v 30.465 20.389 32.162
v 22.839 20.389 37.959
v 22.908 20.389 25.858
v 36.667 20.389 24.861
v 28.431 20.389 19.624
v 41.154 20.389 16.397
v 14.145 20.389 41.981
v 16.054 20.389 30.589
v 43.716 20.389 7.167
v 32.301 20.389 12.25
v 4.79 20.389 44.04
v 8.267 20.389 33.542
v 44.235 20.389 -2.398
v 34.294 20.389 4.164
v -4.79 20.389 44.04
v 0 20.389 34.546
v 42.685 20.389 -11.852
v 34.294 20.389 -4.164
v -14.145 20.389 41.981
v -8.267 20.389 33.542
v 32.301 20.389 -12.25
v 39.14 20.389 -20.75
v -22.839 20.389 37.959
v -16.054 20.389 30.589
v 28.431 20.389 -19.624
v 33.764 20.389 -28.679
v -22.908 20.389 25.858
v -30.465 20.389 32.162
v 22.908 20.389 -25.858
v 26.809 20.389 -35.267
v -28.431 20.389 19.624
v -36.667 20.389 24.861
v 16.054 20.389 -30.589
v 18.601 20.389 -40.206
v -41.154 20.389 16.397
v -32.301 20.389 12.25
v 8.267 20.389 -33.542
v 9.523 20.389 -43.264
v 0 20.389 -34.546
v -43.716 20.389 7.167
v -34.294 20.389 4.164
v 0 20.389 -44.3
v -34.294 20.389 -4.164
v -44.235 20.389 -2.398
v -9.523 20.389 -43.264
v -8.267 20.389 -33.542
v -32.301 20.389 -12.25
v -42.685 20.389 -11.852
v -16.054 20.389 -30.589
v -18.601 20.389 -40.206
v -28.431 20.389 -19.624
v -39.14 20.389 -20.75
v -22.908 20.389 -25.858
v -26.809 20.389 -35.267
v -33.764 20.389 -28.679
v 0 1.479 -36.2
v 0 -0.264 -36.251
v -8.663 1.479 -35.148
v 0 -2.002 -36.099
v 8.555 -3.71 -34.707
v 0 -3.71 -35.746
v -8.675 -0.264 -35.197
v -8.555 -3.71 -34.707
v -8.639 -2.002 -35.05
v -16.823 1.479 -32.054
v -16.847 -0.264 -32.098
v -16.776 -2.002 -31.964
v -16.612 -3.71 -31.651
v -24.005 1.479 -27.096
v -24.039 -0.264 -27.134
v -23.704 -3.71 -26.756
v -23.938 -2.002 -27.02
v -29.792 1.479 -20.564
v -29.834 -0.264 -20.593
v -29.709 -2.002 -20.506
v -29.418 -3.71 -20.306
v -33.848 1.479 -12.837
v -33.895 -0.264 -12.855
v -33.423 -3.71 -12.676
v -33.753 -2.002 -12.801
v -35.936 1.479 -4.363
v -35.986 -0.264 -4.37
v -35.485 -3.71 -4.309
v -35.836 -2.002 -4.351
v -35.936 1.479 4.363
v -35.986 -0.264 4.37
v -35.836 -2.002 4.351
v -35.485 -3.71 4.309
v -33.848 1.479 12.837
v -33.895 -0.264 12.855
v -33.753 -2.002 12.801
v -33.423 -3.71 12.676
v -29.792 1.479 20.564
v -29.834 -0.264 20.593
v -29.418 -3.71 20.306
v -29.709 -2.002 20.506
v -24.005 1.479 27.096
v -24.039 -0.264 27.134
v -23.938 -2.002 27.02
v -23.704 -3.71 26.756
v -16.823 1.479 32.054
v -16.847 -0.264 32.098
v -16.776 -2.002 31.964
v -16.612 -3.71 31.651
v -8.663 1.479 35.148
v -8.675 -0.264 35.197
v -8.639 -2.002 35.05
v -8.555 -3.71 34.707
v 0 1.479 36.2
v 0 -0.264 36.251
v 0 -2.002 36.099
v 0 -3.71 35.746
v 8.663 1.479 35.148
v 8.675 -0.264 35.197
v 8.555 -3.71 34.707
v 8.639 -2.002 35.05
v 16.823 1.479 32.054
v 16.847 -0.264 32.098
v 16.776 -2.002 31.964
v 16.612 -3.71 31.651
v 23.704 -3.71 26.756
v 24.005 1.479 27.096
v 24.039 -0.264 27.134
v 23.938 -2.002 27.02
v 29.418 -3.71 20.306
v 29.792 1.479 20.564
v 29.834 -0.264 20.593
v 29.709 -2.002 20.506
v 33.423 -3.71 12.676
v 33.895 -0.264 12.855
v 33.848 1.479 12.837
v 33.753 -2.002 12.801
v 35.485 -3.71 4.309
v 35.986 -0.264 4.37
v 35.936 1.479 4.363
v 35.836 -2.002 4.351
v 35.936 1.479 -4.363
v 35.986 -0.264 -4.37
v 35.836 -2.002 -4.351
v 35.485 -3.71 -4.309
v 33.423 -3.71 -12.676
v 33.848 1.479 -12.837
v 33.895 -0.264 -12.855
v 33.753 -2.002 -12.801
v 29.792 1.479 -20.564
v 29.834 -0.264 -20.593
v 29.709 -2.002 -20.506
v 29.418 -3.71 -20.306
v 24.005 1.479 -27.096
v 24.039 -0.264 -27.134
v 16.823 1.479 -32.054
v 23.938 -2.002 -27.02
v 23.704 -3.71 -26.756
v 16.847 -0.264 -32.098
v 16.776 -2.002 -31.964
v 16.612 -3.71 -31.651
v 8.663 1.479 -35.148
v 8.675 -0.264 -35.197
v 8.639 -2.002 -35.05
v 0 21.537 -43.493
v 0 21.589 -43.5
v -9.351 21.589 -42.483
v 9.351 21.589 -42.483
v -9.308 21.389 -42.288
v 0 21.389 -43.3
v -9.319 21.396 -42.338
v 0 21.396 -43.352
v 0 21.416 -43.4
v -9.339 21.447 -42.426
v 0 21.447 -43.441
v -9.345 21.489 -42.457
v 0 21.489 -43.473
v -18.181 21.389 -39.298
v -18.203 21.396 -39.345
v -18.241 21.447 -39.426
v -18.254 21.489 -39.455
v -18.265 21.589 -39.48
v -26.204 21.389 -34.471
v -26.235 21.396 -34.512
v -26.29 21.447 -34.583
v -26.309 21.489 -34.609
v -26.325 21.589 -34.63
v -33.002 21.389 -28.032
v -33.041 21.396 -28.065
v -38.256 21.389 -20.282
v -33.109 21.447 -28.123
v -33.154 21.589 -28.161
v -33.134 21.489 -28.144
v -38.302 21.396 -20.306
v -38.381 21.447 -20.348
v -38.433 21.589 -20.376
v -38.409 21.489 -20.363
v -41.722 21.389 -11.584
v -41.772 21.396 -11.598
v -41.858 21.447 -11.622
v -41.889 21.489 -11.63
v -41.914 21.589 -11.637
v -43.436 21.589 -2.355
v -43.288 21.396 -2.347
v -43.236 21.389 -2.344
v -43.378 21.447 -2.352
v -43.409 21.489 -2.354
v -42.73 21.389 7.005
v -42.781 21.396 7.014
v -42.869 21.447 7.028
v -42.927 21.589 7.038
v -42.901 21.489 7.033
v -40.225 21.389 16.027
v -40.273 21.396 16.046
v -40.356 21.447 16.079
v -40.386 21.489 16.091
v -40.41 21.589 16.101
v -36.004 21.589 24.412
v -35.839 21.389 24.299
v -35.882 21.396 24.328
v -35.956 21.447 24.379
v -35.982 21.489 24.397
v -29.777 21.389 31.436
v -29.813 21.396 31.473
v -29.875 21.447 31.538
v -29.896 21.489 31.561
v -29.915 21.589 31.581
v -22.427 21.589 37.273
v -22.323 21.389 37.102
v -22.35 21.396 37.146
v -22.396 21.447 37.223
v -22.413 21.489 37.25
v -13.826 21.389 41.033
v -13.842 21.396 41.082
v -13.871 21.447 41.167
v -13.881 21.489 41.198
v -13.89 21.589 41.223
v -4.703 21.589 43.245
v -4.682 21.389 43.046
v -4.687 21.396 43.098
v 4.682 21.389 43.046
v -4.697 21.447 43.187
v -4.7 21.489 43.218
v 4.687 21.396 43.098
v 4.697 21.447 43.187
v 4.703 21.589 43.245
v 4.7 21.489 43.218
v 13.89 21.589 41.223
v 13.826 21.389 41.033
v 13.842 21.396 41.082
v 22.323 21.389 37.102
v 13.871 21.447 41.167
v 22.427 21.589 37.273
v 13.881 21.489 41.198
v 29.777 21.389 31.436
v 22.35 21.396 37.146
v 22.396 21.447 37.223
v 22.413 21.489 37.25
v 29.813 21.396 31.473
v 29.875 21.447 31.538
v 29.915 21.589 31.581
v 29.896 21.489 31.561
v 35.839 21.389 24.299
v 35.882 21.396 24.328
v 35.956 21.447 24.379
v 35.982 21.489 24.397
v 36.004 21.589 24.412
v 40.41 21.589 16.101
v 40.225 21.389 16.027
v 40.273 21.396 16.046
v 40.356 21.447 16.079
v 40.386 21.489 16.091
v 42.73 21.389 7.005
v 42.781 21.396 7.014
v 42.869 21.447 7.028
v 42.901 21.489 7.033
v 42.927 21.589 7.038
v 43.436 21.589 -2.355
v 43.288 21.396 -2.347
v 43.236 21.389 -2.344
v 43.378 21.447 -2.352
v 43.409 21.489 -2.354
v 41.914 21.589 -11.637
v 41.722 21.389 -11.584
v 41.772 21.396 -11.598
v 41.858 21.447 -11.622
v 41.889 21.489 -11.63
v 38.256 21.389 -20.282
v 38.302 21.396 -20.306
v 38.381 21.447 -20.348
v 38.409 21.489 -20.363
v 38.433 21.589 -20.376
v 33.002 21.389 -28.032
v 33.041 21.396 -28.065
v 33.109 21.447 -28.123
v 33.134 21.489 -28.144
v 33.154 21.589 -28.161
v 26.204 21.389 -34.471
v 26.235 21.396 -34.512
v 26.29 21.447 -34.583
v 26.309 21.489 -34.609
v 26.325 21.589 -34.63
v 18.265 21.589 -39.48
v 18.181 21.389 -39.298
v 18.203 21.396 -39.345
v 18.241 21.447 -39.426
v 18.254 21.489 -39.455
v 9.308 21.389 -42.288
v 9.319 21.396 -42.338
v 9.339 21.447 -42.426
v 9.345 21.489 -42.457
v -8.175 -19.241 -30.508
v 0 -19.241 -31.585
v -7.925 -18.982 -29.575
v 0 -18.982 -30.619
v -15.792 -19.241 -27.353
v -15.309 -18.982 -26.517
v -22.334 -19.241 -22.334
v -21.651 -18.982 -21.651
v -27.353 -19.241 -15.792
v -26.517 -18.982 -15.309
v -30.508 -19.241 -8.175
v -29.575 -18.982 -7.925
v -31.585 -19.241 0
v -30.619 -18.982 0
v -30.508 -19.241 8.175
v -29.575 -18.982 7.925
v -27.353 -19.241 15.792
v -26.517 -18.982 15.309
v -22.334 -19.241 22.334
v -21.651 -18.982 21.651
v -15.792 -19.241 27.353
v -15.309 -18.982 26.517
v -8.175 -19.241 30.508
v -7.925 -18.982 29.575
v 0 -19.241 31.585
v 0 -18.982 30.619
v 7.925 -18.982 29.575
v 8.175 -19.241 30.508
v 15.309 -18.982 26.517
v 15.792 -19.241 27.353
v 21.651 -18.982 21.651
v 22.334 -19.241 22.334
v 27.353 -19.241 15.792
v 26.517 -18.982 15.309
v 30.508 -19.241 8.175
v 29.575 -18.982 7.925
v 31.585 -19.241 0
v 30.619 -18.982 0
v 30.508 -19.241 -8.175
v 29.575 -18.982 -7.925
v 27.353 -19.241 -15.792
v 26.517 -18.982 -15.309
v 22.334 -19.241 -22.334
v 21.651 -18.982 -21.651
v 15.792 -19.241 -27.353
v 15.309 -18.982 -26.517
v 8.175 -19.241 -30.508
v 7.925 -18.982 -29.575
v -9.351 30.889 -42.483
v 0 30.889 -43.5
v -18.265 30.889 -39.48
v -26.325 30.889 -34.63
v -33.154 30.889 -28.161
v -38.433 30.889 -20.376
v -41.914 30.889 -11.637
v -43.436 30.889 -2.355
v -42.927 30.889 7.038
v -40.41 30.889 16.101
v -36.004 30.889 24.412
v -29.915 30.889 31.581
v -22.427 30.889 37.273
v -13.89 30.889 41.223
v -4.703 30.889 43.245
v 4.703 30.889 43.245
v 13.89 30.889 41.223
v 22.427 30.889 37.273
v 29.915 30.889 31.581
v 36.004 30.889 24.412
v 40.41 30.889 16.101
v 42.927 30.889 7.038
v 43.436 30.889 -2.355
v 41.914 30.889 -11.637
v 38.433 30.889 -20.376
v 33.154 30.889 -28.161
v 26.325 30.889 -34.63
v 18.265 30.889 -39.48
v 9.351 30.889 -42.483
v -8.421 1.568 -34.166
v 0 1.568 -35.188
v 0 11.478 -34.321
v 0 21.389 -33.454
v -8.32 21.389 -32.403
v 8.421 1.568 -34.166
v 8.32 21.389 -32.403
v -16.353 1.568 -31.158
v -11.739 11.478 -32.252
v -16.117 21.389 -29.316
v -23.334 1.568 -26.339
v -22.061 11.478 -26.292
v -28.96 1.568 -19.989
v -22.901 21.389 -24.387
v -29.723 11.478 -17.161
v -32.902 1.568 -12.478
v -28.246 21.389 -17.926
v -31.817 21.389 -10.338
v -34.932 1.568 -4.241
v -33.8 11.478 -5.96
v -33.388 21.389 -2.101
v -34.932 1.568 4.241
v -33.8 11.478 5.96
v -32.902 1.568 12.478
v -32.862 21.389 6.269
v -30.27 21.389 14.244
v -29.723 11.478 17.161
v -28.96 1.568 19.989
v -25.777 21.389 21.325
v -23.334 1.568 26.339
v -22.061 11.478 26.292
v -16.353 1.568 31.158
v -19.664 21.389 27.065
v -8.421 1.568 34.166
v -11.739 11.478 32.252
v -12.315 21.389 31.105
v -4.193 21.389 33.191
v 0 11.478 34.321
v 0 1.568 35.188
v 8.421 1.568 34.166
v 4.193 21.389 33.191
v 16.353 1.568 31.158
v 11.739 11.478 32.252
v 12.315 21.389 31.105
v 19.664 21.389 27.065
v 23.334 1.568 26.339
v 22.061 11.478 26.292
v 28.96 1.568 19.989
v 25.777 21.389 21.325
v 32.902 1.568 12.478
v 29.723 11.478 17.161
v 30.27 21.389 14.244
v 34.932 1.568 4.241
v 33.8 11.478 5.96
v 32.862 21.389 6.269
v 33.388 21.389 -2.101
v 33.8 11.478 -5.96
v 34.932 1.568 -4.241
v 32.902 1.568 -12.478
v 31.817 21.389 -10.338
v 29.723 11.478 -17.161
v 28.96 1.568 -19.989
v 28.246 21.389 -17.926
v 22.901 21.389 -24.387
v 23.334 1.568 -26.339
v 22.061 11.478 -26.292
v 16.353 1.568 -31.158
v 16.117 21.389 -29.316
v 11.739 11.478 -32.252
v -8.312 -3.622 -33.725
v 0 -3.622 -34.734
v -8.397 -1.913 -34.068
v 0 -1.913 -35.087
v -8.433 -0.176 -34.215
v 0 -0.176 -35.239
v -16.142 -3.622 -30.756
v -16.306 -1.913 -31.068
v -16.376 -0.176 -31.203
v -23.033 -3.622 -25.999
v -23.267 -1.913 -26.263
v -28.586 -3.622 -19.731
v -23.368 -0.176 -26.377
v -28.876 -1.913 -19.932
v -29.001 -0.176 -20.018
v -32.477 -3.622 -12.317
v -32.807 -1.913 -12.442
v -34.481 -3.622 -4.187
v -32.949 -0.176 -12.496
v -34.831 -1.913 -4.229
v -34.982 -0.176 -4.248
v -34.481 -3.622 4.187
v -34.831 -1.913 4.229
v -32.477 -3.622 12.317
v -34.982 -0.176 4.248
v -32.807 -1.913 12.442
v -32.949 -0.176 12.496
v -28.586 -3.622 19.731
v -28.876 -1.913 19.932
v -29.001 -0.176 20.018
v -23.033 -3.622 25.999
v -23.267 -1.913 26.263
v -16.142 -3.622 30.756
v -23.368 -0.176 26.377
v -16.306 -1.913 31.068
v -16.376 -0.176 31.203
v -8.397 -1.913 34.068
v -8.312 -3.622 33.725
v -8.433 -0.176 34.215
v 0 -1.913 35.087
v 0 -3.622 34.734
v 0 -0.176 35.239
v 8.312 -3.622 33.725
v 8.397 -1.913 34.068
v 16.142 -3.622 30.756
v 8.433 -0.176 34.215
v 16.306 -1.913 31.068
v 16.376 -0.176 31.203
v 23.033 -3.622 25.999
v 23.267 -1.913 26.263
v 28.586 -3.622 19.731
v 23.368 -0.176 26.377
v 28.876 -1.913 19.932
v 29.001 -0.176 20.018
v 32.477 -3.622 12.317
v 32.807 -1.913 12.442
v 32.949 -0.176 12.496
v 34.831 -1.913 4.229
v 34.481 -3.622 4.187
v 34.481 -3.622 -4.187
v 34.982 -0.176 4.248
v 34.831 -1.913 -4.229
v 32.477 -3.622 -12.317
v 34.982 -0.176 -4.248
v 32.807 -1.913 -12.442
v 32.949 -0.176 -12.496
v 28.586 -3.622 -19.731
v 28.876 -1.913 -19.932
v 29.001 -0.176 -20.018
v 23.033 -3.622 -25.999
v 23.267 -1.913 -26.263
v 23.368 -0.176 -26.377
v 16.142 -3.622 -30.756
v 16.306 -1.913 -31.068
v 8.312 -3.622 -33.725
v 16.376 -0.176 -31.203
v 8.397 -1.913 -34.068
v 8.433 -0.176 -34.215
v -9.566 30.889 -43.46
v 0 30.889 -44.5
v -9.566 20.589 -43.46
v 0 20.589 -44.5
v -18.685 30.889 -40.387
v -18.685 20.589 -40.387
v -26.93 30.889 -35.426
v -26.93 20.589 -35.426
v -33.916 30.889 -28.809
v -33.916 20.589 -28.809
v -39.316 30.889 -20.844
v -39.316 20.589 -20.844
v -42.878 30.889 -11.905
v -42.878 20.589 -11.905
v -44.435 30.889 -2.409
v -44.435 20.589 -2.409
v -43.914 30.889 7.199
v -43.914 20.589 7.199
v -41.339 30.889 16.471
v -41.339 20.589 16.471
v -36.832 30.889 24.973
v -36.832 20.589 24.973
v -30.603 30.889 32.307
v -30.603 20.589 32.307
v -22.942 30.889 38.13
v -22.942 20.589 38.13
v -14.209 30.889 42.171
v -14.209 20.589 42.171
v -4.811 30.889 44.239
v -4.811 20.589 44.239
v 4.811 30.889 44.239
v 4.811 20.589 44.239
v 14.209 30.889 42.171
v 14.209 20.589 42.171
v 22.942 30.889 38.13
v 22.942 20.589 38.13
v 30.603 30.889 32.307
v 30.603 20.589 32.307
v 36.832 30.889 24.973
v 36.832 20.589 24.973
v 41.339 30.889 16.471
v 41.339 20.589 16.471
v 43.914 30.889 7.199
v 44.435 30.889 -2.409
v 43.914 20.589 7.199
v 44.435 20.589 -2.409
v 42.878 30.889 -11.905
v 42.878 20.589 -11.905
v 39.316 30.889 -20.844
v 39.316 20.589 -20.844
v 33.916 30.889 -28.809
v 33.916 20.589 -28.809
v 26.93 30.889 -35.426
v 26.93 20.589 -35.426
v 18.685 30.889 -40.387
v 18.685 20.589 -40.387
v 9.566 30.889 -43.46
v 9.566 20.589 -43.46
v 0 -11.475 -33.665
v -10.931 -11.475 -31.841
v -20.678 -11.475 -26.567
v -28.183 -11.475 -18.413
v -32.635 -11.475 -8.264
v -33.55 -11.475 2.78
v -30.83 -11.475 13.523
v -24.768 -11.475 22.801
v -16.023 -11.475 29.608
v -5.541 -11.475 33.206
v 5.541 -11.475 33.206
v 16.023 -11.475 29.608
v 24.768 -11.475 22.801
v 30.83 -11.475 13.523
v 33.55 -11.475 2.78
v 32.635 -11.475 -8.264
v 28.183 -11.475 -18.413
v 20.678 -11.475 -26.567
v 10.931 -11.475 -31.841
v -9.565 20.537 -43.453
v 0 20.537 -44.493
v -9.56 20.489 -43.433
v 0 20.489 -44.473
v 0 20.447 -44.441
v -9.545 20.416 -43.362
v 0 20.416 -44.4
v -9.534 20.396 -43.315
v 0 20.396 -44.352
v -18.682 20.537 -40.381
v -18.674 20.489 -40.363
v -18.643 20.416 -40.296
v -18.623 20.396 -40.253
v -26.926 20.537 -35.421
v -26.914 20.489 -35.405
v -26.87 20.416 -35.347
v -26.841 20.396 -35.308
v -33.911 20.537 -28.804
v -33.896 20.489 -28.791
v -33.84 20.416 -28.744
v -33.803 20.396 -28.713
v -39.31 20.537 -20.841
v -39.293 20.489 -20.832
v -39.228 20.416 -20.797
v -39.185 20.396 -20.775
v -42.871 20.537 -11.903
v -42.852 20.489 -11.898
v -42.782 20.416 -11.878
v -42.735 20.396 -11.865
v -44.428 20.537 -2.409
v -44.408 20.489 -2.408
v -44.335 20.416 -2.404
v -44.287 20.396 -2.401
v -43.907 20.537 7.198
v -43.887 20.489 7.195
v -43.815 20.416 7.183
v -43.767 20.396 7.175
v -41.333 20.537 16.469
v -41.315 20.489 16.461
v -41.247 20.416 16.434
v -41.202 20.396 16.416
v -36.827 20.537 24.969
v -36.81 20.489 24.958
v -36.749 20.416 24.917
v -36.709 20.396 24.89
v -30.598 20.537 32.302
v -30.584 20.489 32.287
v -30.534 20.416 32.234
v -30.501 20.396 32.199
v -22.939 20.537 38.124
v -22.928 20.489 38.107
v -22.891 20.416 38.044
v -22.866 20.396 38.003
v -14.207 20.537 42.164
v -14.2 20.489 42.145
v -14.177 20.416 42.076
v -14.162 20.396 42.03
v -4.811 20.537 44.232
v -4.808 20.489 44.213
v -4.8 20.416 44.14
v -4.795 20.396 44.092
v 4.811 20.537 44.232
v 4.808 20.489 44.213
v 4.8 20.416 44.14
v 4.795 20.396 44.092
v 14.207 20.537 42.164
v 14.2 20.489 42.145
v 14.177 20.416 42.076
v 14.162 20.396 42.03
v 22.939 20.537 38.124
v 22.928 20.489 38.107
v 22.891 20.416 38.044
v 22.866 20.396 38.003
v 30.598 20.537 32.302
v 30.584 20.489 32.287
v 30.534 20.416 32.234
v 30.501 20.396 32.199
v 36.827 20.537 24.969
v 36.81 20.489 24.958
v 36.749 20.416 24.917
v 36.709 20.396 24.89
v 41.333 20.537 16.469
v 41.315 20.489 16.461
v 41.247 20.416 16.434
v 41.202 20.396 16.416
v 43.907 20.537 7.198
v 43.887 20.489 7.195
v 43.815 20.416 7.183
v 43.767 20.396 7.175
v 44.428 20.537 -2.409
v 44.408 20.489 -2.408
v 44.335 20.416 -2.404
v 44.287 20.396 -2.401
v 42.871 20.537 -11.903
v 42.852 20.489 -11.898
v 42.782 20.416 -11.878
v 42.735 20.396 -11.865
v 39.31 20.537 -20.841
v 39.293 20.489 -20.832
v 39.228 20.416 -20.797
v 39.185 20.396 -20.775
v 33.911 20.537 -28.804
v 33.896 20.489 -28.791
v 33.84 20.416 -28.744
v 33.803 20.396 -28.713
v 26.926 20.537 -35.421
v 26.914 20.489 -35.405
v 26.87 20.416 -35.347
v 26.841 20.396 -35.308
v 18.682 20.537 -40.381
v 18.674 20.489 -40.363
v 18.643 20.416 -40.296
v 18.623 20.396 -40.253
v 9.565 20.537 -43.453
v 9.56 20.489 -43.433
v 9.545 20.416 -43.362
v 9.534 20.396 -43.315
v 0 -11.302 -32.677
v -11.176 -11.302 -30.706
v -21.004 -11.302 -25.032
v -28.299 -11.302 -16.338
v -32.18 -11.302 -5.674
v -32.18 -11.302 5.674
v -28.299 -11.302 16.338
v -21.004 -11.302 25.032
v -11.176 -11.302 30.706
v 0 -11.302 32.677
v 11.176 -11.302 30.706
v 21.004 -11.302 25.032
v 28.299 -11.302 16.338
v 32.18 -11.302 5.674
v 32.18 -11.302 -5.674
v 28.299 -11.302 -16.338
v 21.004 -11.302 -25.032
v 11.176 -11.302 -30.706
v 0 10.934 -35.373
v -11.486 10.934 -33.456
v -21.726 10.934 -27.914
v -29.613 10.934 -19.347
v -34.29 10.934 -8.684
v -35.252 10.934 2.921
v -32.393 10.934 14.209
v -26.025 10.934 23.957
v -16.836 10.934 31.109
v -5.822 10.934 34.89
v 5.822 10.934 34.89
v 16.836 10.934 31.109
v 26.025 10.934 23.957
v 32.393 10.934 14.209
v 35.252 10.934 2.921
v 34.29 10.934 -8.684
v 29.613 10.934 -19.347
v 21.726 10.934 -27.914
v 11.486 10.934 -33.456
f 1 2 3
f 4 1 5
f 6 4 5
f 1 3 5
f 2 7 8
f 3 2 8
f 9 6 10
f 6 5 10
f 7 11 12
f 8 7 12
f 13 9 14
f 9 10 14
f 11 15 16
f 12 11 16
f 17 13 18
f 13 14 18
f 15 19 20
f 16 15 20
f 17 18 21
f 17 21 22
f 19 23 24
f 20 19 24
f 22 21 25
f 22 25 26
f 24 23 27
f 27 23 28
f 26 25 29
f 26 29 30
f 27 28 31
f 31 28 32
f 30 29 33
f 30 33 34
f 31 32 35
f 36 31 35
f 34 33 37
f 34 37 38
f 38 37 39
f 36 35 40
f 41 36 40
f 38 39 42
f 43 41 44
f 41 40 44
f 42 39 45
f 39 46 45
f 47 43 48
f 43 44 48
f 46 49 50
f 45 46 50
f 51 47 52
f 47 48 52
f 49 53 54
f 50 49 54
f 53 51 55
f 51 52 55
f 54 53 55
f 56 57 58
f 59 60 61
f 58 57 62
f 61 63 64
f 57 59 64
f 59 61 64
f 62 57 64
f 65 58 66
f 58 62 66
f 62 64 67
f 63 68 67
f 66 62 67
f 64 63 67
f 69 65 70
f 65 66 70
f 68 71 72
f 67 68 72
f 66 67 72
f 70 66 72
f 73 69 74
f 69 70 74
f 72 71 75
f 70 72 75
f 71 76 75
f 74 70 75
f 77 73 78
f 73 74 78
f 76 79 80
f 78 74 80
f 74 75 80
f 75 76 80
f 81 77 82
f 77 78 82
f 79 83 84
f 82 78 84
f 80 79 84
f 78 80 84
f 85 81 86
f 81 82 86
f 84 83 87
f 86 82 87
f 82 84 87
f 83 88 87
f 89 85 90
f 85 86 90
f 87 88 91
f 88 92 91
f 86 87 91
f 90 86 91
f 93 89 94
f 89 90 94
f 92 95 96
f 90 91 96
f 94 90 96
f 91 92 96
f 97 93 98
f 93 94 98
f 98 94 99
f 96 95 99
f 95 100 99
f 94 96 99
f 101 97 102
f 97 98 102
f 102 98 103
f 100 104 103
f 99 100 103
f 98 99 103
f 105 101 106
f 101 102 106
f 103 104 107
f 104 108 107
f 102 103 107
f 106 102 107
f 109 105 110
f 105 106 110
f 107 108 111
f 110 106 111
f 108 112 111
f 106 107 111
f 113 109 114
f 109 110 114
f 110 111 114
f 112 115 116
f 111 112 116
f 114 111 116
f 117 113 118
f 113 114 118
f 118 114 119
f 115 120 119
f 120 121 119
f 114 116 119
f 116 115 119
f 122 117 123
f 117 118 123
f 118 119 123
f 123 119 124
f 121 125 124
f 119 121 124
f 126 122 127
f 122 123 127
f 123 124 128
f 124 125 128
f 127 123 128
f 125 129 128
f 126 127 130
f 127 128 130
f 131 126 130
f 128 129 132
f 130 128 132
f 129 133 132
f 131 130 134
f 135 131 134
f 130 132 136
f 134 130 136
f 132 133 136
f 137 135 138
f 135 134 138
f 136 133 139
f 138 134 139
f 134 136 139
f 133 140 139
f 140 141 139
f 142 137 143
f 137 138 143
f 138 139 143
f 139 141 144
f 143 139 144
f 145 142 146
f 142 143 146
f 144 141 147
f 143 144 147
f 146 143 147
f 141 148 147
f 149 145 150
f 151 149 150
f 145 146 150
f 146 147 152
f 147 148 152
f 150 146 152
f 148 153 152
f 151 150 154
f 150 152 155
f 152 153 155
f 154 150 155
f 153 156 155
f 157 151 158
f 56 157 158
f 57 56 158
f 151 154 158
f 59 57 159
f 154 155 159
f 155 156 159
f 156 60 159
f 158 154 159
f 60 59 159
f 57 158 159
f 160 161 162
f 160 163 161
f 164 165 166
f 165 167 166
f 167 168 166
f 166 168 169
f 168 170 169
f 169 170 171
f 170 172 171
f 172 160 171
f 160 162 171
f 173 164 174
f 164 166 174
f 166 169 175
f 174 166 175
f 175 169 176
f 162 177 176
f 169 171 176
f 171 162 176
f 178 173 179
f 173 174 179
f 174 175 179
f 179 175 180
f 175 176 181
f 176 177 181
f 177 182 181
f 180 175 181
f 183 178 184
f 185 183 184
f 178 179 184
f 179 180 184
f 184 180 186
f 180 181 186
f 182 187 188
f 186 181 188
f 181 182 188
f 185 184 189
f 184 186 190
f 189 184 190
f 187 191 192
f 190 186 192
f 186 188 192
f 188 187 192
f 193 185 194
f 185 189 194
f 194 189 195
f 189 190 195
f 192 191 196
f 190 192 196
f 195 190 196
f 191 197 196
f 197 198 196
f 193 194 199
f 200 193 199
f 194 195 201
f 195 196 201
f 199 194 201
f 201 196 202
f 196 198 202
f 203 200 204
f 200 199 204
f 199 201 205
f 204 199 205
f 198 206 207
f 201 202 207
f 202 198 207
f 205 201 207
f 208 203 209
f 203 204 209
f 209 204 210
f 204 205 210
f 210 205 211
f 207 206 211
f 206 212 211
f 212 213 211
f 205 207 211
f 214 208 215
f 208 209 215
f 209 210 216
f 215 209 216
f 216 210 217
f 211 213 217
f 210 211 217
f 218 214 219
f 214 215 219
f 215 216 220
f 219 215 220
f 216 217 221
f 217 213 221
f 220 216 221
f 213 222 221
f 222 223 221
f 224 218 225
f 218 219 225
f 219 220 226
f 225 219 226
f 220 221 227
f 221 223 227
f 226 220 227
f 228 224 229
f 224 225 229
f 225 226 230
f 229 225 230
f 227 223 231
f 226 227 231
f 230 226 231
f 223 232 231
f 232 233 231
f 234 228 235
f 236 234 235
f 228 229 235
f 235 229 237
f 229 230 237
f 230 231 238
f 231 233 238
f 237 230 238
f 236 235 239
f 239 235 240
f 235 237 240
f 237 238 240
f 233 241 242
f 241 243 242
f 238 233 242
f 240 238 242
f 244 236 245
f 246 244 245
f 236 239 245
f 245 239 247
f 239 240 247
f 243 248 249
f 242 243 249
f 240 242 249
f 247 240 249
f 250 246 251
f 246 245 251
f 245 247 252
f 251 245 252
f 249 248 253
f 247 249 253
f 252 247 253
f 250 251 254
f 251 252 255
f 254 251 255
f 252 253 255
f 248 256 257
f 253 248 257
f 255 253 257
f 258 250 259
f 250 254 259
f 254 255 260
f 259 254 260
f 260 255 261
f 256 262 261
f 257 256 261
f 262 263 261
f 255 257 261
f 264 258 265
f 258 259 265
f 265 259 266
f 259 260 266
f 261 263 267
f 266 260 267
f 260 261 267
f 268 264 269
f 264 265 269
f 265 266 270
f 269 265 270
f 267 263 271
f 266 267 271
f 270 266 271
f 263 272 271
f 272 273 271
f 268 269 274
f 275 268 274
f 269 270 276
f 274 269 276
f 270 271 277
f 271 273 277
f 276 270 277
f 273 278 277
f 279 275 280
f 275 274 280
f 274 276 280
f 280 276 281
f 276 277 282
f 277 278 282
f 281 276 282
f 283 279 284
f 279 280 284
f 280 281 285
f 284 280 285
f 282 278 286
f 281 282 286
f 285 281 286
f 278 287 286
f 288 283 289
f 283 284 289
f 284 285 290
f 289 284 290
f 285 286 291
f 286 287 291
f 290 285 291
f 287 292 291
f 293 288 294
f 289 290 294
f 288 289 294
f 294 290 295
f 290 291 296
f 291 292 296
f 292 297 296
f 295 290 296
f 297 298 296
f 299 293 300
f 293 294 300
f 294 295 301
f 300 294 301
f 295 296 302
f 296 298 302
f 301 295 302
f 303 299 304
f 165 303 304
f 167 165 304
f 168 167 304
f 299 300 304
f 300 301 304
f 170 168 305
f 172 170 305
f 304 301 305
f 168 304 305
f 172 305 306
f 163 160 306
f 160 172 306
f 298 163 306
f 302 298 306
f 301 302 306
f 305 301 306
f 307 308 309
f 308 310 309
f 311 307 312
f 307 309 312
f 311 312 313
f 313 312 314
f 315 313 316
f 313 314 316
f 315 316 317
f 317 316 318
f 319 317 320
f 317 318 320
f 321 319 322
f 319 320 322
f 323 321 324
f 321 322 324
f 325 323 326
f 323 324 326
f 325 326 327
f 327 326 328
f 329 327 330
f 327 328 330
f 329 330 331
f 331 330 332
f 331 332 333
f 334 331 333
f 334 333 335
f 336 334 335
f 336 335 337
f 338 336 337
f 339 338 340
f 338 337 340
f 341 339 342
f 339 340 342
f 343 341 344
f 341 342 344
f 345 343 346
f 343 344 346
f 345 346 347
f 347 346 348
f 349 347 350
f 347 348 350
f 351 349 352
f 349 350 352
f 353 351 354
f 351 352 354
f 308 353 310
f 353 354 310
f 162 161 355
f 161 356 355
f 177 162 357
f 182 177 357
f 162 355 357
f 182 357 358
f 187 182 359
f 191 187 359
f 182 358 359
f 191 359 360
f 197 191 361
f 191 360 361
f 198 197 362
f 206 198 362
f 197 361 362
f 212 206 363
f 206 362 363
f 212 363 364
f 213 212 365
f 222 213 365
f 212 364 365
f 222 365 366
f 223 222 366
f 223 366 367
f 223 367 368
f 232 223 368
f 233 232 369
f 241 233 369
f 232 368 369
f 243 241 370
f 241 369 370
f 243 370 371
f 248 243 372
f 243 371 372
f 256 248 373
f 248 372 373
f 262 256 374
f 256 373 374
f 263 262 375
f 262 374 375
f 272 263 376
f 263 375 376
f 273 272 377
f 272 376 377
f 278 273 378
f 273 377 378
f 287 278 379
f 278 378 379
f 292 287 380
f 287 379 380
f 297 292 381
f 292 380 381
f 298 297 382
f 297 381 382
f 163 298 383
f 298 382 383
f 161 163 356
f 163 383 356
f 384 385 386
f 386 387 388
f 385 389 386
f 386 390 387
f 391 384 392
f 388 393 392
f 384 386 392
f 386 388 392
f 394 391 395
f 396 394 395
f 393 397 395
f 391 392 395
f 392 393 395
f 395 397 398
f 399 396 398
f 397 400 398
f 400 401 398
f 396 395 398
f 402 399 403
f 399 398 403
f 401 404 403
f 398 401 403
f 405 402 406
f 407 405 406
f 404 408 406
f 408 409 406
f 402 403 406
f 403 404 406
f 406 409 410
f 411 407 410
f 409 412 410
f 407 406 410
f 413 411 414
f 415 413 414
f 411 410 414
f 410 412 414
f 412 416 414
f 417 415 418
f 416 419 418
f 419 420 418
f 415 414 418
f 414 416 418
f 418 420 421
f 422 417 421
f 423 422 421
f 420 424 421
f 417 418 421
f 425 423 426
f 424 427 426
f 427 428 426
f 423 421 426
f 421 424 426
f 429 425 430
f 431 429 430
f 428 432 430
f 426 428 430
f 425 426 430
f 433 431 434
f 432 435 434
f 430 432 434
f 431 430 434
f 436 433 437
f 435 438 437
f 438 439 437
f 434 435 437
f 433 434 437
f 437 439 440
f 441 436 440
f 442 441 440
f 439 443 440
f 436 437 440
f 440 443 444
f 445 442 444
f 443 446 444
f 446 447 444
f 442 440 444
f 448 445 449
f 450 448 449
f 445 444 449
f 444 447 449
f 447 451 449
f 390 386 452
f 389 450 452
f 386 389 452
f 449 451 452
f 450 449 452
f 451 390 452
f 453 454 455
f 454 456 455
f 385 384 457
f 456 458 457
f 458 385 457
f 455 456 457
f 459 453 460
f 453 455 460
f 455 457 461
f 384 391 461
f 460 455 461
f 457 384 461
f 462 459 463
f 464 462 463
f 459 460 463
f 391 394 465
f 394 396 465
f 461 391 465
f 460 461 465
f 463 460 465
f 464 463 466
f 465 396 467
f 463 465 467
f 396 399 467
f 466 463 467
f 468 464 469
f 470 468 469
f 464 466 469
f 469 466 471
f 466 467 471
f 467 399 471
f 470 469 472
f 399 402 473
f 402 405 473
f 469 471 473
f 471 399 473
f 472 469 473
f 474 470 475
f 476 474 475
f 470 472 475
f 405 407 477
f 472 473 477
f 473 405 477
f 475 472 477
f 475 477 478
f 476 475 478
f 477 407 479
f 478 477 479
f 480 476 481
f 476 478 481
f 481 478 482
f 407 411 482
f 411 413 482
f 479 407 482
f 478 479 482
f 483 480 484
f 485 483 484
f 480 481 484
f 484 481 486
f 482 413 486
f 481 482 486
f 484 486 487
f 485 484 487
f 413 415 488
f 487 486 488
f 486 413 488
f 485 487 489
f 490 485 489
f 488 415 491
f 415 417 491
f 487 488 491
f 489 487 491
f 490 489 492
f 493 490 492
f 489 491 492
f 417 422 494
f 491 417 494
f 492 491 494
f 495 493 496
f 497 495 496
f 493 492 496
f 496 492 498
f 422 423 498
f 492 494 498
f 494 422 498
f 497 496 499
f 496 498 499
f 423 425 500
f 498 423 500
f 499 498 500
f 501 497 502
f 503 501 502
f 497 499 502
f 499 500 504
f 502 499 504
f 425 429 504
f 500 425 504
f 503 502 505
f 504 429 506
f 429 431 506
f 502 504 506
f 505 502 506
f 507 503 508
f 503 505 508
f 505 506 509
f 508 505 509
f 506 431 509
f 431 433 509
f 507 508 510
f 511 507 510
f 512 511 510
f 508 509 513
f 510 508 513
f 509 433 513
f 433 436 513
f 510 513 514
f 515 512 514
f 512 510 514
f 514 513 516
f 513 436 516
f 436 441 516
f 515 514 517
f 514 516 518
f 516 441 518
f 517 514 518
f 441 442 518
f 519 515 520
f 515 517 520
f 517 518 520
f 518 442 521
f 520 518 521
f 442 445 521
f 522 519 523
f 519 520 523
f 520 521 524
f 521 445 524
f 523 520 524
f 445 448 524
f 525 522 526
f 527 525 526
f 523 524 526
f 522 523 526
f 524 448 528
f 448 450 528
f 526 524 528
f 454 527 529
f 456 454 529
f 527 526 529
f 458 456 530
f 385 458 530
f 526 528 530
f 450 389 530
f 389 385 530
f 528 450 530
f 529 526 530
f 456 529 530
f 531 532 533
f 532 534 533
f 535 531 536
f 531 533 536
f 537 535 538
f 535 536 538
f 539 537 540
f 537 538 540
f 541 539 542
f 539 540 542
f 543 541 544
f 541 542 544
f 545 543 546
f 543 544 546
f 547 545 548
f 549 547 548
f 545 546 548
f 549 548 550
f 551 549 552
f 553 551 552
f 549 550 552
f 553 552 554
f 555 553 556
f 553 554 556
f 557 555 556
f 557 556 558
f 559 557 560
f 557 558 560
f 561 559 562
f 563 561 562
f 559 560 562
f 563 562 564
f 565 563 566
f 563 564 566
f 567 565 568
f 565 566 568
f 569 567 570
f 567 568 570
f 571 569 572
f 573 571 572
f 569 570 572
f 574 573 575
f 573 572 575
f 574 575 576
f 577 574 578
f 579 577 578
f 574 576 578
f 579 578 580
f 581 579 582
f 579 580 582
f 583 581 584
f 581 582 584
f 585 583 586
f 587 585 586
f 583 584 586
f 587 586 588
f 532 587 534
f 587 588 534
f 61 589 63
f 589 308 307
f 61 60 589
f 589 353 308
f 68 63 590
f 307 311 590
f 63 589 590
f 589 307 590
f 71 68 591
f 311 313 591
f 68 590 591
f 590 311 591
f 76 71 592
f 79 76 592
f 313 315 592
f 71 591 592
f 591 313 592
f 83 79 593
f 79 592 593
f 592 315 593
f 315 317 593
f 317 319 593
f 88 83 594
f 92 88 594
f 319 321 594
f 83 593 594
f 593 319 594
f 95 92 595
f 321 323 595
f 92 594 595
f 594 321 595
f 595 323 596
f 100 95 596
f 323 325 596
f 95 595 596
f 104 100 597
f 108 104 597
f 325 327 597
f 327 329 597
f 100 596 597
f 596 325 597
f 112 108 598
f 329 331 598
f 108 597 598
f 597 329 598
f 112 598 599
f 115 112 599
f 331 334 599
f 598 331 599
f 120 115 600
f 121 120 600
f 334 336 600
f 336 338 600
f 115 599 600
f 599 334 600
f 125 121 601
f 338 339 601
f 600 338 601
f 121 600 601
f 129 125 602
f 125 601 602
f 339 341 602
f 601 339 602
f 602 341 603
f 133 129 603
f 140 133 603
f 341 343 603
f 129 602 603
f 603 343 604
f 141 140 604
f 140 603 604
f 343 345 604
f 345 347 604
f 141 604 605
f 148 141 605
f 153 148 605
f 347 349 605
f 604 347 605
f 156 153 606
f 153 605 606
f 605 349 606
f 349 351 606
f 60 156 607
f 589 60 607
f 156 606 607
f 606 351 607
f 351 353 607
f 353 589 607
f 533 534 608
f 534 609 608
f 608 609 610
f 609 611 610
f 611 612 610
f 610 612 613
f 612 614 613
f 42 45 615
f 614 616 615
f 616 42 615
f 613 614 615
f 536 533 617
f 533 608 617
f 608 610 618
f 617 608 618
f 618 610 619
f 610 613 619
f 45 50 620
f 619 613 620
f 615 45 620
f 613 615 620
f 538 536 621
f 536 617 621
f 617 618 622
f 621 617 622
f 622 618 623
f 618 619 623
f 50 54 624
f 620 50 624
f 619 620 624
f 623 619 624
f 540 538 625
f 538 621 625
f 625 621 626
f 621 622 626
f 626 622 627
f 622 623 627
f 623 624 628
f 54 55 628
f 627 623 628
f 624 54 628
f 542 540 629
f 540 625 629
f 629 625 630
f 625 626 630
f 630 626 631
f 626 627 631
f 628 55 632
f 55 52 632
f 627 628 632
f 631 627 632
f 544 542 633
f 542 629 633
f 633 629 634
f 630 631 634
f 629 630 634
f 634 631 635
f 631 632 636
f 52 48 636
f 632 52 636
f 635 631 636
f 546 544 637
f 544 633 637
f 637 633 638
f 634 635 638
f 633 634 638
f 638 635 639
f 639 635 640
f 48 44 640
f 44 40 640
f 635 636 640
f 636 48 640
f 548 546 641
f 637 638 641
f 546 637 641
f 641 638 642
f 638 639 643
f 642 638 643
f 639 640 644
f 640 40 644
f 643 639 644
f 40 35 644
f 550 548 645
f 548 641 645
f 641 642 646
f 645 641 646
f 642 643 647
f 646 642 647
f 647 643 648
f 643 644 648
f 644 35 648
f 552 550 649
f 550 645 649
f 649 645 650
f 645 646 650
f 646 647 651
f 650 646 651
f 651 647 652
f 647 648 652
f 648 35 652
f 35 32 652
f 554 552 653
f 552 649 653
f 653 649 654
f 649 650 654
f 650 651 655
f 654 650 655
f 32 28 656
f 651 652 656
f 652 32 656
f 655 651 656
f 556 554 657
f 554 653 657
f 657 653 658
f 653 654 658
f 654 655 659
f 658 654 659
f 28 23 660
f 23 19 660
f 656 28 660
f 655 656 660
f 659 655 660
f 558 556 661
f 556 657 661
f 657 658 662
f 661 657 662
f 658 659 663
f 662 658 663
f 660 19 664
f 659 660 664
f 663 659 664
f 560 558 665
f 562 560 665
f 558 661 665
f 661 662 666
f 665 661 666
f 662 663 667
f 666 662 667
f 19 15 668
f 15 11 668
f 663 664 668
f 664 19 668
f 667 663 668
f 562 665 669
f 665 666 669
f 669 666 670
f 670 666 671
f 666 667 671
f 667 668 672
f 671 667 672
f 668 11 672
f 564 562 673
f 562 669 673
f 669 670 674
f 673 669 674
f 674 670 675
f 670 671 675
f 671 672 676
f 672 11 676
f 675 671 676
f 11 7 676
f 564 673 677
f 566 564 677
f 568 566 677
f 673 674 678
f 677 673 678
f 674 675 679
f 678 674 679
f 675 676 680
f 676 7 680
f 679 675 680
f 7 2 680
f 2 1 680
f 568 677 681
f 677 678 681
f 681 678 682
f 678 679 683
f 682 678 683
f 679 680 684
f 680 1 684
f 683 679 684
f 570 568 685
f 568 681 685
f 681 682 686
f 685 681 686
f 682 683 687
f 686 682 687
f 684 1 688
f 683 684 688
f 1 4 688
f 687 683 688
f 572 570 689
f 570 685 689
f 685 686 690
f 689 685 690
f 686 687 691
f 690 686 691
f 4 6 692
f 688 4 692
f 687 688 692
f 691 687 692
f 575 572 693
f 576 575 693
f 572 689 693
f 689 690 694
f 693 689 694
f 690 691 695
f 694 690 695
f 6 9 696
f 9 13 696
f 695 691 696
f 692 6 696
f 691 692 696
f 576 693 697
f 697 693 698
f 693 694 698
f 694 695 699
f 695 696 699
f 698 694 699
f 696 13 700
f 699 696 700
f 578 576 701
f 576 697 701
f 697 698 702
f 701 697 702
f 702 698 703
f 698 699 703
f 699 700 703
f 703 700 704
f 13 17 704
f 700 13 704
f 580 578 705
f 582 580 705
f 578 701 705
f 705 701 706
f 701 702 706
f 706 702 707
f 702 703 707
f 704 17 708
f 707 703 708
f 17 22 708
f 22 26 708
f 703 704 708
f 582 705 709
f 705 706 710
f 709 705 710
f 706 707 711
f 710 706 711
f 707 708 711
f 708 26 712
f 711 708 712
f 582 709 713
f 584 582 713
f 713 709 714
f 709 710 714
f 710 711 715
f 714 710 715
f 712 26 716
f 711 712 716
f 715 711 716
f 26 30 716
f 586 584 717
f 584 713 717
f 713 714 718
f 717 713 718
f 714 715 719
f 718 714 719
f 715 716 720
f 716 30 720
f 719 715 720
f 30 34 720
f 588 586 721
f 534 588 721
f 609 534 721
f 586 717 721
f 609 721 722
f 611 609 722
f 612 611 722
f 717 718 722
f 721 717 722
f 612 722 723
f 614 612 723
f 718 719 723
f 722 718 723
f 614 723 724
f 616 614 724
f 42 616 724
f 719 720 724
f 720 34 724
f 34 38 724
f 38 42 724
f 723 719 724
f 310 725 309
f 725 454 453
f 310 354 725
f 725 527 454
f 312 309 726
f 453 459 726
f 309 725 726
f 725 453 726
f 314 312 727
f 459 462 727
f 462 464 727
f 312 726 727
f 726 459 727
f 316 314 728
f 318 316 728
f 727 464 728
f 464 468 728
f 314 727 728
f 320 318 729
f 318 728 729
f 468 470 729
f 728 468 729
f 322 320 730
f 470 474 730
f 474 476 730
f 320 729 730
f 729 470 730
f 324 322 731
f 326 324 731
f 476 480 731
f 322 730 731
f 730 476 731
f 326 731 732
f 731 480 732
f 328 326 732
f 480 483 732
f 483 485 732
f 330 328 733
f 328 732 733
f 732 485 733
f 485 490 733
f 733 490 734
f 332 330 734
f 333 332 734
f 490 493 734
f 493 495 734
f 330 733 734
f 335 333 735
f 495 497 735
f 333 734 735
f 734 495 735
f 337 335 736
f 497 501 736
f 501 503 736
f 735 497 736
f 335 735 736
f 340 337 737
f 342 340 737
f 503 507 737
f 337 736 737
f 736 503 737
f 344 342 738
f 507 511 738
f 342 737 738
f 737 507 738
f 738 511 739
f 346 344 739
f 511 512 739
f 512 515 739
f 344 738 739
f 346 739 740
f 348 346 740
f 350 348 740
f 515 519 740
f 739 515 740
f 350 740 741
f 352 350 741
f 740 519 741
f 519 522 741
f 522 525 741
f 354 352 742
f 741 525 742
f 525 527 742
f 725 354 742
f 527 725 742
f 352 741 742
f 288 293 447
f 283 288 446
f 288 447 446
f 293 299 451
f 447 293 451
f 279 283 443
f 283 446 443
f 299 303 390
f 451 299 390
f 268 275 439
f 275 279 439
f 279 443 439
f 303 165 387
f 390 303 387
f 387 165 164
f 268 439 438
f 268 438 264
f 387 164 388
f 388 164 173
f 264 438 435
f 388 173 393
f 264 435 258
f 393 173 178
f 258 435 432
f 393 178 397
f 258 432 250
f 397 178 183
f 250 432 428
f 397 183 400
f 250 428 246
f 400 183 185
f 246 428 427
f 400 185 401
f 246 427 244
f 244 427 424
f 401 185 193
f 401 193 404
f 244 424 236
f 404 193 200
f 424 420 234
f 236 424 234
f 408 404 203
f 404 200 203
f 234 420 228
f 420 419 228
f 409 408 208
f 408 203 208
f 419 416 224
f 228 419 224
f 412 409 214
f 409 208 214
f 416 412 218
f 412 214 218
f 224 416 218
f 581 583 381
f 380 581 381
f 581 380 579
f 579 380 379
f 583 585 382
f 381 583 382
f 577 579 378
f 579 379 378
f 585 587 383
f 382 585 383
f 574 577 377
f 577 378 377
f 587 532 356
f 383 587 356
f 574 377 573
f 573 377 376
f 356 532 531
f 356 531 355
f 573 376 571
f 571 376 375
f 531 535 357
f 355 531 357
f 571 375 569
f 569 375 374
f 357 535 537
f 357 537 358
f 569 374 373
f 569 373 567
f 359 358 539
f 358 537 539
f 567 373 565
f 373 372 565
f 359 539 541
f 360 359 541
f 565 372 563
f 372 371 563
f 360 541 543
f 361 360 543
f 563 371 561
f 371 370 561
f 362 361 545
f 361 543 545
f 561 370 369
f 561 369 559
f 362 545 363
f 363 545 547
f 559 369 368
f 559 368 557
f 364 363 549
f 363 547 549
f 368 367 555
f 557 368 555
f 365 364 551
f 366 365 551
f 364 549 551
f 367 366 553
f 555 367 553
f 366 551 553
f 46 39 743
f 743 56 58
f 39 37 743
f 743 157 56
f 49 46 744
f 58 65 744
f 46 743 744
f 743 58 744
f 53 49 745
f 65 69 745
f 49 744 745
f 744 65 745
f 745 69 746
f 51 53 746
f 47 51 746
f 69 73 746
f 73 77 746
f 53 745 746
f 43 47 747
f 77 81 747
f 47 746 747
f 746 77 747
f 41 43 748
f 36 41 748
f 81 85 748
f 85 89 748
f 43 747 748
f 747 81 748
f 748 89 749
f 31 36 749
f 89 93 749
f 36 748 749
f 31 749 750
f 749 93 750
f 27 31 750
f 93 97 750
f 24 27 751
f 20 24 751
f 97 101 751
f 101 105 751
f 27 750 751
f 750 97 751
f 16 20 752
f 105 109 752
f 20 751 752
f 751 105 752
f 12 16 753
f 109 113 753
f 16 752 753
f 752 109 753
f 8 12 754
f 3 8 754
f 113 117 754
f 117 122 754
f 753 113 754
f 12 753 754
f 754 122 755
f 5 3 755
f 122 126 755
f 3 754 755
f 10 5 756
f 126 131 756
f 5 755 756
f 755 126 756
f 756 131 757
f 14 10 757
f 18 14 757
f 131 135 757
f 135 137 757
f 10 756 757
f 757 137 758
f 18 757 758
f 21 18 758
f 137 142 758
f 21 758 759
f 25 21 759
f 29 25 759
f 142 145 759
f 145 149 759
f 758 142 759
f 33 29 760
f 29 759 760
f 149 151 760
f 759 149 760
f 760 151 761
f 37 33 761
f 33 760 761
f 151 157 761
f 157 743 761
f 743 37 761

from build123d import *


with BuildPart() as part:
    # Çizim1 → Döndür1 (revolve)
    with BuildSketch(Plane.XY, mode=Mode.PRIVATE) as d_nd_r1_sk:
        with BuildLine():
            Line((-44.5, 30.888888889), (-44.5, 20.588888889))
            ThreePointArc((-44.5, 20.588888889), (-44.441421356, 20.447467533), (-44.3, 20.388888889))
            Line((-44.3, 20.388888889), (-34.545654251, 20.388888889))
            Line((-34.545654251, 20.388888889), (-36.200013267, 1.479478808))
            ThreePointArc((-36.200013267, 1.479478808), (-36.200013267, -1.135193474), (-35.74598019, -3.710143009))
            Line((-35.74598019, -3.710143009), (-31.584628047, -19.240520634))
            Line((-31.584628047, -19.240520634), (-30.618702221, -18.981701589))
            Line((-30.618702221, -18.981701589), (-34.734417582, -3.621642749))
            ThreePointArc((-34.734417582, -3.621642749), (-35.188450659, -1.046693214), (-35.188450659, 1.567979069))
            Line((-35.188450659, 1.567979069), (-33.454345749, 21.388888889))
            Line((-33.454345749, 21.388888889), (-43.3, 21.388888889))
            ThreePointArc((-43.3, 21.388888889), (-43.441421356, 21.447467533), (-43.5, 21.588888889))
            Line((-43.5, 21.588888889), (-43.5, 30.888888889))
            Line((-43.5, 30.888888889), (-44.5, 30.888888889))
        make_face()
    revolve(d_nd_r1_sk.sketch.rotate(Axis((0, 0, 0), (0, 1, 0)), 270), axis=Axis((0, 0, 0), (0, 1, 0)))


solid = part.part
